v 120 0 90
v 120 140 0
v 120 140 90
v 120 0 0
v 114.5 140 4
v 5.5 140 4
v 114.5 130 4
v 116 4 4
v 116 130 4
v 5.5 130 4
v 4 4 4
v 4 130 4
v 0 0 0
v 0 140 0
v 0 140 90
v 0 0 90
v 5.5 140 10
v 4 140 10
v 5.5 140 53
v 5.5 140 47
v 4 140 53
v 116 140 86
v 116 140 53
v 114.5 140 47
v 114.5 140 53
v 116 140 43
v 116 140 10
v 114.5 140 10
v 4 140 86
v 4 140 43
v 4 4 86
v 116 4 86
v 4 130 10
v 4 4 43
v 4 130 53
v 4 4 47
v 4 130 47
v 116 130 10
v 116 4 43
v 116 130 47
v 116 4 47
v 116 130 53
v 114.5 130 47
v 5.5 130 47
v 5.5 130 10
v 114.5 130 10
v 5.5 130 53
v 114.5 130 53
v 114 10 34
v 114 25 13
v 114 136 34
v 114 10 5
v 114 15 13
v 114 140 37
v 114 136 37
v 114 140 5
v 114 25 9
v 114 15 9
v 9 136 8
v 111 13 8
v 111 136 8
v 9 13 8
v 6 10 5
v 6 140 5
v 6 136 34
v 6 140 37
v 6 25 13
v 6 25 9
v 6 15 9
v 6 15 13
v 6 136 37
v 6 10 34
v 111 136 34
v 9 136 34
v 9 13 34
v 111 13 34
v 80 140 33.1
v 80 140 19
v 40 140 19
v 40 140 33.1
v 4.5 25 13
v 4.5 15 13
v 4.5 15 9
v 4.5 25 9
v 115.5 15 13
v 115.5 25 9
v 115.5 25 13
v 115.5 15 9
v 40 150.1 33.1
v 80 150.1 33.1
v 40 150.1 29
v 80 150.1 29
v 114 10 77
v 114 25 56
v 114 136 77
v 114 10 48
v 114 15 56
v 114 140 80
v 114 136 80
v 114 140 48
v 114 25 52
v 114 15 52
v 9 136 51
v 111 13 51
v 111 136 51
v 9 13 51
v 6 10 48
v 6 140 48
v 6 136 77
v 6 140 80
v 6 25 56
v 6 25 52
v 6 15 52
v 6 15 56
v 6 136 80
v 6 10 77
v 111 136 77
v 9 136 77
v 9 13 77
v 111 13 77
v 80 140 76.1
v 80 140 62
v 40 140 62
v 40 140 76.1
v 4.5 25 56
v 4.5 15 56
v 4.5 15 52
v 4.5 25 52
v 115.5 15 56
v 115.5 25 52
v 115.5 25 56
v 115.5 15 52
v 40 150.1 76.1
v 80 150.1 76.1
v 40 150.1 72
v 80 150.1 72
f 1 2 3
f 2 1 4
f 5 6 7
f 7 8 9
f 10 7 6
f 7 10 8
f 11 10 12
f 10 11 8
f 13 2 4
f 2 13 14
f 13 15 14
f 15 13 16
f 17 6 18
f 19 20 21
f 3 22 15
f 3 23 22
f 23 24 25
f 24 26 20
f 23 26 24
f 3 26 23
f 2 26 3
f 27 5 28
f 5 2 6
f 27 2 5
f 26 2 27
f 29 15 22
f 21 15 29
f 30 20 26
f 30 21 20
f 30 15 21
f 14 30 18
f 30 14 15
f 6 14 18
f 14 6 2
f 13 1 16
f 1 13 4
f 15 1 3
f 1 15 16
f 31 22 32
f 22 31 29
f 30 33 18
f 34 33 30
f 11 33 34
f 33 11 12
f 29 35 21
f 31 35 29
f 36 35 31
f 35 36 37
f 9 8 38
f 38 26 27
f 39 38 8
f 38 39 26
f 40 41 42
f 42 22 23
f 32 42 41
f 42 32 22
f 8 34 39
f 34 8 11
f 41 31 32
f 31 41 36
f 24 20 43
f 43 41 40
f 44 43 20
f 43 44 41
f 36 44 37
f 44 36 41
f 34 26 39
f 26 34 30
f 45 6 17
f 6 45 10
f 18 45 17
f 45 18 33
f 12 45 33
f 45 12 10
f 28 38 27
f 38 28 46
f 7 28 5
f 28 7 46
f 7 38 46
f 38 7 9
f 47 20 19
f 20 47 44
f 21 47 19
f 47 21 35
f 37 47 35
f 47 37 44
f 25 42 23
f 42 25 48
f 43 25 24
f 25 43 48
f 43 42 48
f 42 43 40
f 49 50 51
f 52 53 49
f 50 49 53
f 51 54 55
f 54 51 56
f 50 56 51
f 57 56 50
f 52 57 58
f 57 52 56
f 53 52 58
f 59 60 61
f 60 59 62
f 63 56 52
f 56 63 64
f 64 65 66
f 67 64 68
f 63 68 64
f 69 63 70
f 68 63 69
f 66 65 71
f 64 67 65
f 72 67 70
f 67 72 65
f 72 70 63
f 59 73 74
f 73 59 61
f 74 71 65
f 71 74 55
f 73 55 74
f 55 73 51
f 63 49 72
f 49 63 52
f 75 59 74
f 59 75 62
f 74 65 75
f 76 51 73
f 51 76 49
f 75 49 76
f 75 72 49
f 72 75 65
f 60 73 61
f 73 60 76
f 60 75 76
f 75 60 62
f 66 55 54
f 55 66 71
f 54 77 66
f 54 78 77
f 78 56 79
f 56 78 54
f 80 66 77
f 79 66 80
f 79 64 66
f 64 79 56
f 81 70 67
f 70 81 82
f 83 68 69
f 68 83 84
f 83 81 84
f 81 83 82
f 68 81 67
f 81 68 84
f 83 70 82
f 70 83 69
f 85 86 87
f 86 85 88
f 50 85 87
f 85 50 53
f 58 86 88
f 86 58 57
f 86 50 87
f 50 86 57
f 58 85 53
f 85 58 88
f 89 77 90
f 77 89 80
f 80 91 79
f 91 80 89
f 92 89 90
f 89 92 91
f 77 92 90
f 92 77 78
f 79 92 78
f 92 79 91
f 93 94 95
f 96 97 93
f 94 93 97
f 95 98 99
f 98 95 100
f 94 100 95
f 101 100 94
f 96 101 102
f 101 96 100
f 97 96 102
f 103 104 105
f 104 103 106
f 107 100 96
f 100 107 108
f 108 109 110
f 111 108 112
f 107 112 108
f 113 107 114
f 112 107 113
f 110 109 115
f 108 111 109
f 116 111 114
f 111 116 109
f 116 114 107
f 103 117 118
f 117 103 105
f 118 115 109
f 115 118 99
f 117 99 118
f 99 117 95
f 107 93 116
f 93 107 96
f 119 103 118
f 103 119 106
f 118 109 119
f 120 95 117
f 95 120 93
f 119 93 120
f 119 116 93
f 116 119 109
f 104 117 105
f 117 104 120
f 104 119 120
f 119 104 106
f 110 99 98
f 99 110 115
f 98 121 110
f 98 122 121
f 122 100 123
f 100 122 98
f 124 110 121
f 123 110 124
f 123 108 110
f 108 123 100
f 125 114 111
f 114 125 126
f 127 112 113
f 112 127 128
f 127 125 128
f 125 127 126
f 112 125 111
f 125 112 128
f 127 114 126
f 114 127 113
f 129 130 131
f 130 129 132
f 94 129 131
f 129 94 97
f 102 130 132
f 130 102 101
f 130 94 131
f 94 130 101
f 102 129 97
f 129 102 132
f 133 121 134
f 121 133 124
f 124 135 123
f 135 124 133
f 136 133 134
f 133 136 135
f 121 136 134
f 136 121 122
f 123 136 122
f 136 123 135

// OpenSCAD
cadverify_only = "";
module instance(name, part, unit = 1) {
    echo(cadverify_instance = [name, part, unit]);
    if (cadverify_only == "" || cadverify_only == name) children();
}

part = "assembly";

// ---------- parameters (mm) ----------
W = 120; Df = 140; H = 90; t = 4;
DW = 108; DDbox = 126; frontT = 4; pullP = 10; DH = 32;

// frame assembly geometry (assembly coords: x 0..120, y 0..140 back->front, z 0..90)
module frame_asm() {
    union() {
        // bottom
        cube([120, 140, 4]);
        // top
        translate([0, 0, 86]) cube([120, 140, 4]);
        // left wall
        cube([4, 140, 90]);
        // right wall
        translate([116, 0, 0]) cube([4, 140, 90]);
        // back wall
        cube([120, 4, 90]);
        // middle shelf (between side walls, from back to front)
        translate([4, 0, 43]) cube([112, 140, 4]);
        // stop blocks: overlap into walls/floors by 0.1 for manifold union
        // lower left
        translate([3.9, 130, 3.9]) cube([1.6, 10, 6.1]);
        // lower right
        translate([114.5, 130, 3.9]) cube([1.6, 10, 6.1]);
        // upper left (on middle shelf)
        translate([3.9, 130, 46.9]) cube([1.6, 10, 6.1]);
        // upper right
        translate([114.5, 130, 46.9]) cube([1.6, 10, 6.1]);
    }
}

// drawer local geometry (local coords: box min at 0,0,0; x 0..108, y 0..130 box+front, pull to 140, z 0..32, tabs to x -1.5..109.5)
module drawer_local() {
    union() {
        // bottom
        cube([108, 126, 3]);
        // left wall
        translate([0, 0, 3]) cube([3, 126, 26]);
        // right wall
        translate([105, 0, 3]) cube([3, 126, 26]);
        // back wall
        translate([0, 0, 3]) cube([108, 3, 26]);
        // front panel (full height)
        translate([0, 126, 0]) cube([108, 4, 32]);
        // stop tabs (overlap 0.5 into side walls)
        translate([-1.5, 5, 4]) cube([2.0, 10, 4]);
        translate([107.5, 5, 4]) cube([2.0, 10, 4]);
        // pull wedge: convex hull of 4 bars along X at YZ corners
        hull() {
            translate([34, 129.9, 14]) cube([40, 0.1, 0.1]);
            translate([34, 129.9, 28]) cube([40, 0.1, 0.1]);
            translate([34, 140, 24]) cube([40, 0.1, 0.1]);
            translate([34, 140, 28]) cube([40, 0.1, 0.1]);
        }
    }
}

module frame_print() {
    translate([0, 90, 0]) rotate([90, 0, 0]) frame_asm();
}
module drawer_print() {
    drawer_local();
}

if (part == "frame") {
    echo(cadverify_spec = [
        ["bounds", [[0, 0, 0], [120, 90, 140]]],
        ["bodies", 1],
        ["through_holes", 0],
        ["support_faces", [["bed", "-z", 5000]]],
        ["overhangs_allowed", [
            ["lower_left_block", [[3.5, 79, 129], [6, 87, 141]]],
            ["lower_right_block", [[114, 79, 129], [117, 87, 141]]],
            ["upper_left_block", [[3.5, 36, 129], [6, 44, 141]]],
            ["upper_right_block", [[114, 36, 129], [117, 44, 141]]]
        ]],
        ["copies", 1],
        ["details", [
            ["side_wall", "thickness", [-1, 65, 70], [1, 0, 0], 4],
            ["back_plate", "thickness", [60, 65, -1], [0, 0, 1], 4],
            ["block_ll", "material", [[4, 80, 130], [5.5, 86, 140]], 0.9],
            ["block_lr", "material", [[114.5, 80, 130], [116, 86, 140]], 0.9],
            ["block_ul", "material", [[4, 37, 130], [5.5, 43, 140]], 0.9],
            ["block_ur", "material", [[114.5, 37, 130], [116, 43, 140]], 0.9],
            ["cavity_lower", "void", [[6, 47, 4], [114, 86, 129]], 0.9],
            ["cavity_upper", "void", [[6, 4, 4], [114, 43, 129]], 0.9]
        ]]
    ]);
    frame_print();
} else if (part == "drawer") {
    echo(cadverify_spec = [
        ["bounds", [[-1.5, 0, 0], [109.5, 140, 32]]],
        ["bodies", 1],
        ["through_holes", 0],
        ["support_faces", [["bed", "-z", 5000]]],
        ["overhangs_allowed", [
            ["tab_left", [[-2, 4, 3], [1, 16, 9]]],
            ["tab_right", [[107, 4, 3], [111, 16, 9]]],
            ["pull_underside", [[33, 129, 13], [75, 141, 29]]]
        ]],
        ["copies", 2],
        ["details", [
            ["bottom", "thickness", [54, 60, -1], [0, 0, 1], 3],
            ["side_wall", "thickness", [-1, 60, 15], [1, 0, 0], 3],
            ["tab_left", "material", [[-1.5, 5, 4], [0.5, 15, 8]], 0.9],
            ["tab_right", "material", [[107.5, 5, 4], [109.5, 15, 8]], 0.9],
            ["interior", "void", [[4, 4, 4], [104, 125, 28]], 0.9],
            ["pull", "view", [[34, 129, 14], [74, 140, 28]]]
        ]]
    ]);
    drawer_print();
} else if (part == "assembly") {
    echo(cadverify_spec = [
        ["bounds", [[0, 0, 0], [120, 150, 90]]],
        ["support_faces", [["desk", "-z", 5000]]],
        ["allowed_interferences", []],
        ["motions", [
            ["lower_slide", ["drawer_lower"], "slide", [0, 1, 0], [0, 104]],
            ["upper_slide", ["drawer_upper"], "slide", [0, 1, 0], [0, 104]]
        ]],
        ["assembly_order", [
            [["frame"], [0, 0, 0]],
            [["drawer_lower"], [0, -1, -0.03]],
            [["drawer_upper"], [0, -1, -0.03]]
        ]]
    ]);
    instance("frame", "frame") frame_asm();
    instance("drawer_lower", "drawer", 1) translate([6, 10, 5]) drawer_local();
    instance("drawer_upper", "drawer", 1) translate([6, 10, 48]) drawer_local();
}
